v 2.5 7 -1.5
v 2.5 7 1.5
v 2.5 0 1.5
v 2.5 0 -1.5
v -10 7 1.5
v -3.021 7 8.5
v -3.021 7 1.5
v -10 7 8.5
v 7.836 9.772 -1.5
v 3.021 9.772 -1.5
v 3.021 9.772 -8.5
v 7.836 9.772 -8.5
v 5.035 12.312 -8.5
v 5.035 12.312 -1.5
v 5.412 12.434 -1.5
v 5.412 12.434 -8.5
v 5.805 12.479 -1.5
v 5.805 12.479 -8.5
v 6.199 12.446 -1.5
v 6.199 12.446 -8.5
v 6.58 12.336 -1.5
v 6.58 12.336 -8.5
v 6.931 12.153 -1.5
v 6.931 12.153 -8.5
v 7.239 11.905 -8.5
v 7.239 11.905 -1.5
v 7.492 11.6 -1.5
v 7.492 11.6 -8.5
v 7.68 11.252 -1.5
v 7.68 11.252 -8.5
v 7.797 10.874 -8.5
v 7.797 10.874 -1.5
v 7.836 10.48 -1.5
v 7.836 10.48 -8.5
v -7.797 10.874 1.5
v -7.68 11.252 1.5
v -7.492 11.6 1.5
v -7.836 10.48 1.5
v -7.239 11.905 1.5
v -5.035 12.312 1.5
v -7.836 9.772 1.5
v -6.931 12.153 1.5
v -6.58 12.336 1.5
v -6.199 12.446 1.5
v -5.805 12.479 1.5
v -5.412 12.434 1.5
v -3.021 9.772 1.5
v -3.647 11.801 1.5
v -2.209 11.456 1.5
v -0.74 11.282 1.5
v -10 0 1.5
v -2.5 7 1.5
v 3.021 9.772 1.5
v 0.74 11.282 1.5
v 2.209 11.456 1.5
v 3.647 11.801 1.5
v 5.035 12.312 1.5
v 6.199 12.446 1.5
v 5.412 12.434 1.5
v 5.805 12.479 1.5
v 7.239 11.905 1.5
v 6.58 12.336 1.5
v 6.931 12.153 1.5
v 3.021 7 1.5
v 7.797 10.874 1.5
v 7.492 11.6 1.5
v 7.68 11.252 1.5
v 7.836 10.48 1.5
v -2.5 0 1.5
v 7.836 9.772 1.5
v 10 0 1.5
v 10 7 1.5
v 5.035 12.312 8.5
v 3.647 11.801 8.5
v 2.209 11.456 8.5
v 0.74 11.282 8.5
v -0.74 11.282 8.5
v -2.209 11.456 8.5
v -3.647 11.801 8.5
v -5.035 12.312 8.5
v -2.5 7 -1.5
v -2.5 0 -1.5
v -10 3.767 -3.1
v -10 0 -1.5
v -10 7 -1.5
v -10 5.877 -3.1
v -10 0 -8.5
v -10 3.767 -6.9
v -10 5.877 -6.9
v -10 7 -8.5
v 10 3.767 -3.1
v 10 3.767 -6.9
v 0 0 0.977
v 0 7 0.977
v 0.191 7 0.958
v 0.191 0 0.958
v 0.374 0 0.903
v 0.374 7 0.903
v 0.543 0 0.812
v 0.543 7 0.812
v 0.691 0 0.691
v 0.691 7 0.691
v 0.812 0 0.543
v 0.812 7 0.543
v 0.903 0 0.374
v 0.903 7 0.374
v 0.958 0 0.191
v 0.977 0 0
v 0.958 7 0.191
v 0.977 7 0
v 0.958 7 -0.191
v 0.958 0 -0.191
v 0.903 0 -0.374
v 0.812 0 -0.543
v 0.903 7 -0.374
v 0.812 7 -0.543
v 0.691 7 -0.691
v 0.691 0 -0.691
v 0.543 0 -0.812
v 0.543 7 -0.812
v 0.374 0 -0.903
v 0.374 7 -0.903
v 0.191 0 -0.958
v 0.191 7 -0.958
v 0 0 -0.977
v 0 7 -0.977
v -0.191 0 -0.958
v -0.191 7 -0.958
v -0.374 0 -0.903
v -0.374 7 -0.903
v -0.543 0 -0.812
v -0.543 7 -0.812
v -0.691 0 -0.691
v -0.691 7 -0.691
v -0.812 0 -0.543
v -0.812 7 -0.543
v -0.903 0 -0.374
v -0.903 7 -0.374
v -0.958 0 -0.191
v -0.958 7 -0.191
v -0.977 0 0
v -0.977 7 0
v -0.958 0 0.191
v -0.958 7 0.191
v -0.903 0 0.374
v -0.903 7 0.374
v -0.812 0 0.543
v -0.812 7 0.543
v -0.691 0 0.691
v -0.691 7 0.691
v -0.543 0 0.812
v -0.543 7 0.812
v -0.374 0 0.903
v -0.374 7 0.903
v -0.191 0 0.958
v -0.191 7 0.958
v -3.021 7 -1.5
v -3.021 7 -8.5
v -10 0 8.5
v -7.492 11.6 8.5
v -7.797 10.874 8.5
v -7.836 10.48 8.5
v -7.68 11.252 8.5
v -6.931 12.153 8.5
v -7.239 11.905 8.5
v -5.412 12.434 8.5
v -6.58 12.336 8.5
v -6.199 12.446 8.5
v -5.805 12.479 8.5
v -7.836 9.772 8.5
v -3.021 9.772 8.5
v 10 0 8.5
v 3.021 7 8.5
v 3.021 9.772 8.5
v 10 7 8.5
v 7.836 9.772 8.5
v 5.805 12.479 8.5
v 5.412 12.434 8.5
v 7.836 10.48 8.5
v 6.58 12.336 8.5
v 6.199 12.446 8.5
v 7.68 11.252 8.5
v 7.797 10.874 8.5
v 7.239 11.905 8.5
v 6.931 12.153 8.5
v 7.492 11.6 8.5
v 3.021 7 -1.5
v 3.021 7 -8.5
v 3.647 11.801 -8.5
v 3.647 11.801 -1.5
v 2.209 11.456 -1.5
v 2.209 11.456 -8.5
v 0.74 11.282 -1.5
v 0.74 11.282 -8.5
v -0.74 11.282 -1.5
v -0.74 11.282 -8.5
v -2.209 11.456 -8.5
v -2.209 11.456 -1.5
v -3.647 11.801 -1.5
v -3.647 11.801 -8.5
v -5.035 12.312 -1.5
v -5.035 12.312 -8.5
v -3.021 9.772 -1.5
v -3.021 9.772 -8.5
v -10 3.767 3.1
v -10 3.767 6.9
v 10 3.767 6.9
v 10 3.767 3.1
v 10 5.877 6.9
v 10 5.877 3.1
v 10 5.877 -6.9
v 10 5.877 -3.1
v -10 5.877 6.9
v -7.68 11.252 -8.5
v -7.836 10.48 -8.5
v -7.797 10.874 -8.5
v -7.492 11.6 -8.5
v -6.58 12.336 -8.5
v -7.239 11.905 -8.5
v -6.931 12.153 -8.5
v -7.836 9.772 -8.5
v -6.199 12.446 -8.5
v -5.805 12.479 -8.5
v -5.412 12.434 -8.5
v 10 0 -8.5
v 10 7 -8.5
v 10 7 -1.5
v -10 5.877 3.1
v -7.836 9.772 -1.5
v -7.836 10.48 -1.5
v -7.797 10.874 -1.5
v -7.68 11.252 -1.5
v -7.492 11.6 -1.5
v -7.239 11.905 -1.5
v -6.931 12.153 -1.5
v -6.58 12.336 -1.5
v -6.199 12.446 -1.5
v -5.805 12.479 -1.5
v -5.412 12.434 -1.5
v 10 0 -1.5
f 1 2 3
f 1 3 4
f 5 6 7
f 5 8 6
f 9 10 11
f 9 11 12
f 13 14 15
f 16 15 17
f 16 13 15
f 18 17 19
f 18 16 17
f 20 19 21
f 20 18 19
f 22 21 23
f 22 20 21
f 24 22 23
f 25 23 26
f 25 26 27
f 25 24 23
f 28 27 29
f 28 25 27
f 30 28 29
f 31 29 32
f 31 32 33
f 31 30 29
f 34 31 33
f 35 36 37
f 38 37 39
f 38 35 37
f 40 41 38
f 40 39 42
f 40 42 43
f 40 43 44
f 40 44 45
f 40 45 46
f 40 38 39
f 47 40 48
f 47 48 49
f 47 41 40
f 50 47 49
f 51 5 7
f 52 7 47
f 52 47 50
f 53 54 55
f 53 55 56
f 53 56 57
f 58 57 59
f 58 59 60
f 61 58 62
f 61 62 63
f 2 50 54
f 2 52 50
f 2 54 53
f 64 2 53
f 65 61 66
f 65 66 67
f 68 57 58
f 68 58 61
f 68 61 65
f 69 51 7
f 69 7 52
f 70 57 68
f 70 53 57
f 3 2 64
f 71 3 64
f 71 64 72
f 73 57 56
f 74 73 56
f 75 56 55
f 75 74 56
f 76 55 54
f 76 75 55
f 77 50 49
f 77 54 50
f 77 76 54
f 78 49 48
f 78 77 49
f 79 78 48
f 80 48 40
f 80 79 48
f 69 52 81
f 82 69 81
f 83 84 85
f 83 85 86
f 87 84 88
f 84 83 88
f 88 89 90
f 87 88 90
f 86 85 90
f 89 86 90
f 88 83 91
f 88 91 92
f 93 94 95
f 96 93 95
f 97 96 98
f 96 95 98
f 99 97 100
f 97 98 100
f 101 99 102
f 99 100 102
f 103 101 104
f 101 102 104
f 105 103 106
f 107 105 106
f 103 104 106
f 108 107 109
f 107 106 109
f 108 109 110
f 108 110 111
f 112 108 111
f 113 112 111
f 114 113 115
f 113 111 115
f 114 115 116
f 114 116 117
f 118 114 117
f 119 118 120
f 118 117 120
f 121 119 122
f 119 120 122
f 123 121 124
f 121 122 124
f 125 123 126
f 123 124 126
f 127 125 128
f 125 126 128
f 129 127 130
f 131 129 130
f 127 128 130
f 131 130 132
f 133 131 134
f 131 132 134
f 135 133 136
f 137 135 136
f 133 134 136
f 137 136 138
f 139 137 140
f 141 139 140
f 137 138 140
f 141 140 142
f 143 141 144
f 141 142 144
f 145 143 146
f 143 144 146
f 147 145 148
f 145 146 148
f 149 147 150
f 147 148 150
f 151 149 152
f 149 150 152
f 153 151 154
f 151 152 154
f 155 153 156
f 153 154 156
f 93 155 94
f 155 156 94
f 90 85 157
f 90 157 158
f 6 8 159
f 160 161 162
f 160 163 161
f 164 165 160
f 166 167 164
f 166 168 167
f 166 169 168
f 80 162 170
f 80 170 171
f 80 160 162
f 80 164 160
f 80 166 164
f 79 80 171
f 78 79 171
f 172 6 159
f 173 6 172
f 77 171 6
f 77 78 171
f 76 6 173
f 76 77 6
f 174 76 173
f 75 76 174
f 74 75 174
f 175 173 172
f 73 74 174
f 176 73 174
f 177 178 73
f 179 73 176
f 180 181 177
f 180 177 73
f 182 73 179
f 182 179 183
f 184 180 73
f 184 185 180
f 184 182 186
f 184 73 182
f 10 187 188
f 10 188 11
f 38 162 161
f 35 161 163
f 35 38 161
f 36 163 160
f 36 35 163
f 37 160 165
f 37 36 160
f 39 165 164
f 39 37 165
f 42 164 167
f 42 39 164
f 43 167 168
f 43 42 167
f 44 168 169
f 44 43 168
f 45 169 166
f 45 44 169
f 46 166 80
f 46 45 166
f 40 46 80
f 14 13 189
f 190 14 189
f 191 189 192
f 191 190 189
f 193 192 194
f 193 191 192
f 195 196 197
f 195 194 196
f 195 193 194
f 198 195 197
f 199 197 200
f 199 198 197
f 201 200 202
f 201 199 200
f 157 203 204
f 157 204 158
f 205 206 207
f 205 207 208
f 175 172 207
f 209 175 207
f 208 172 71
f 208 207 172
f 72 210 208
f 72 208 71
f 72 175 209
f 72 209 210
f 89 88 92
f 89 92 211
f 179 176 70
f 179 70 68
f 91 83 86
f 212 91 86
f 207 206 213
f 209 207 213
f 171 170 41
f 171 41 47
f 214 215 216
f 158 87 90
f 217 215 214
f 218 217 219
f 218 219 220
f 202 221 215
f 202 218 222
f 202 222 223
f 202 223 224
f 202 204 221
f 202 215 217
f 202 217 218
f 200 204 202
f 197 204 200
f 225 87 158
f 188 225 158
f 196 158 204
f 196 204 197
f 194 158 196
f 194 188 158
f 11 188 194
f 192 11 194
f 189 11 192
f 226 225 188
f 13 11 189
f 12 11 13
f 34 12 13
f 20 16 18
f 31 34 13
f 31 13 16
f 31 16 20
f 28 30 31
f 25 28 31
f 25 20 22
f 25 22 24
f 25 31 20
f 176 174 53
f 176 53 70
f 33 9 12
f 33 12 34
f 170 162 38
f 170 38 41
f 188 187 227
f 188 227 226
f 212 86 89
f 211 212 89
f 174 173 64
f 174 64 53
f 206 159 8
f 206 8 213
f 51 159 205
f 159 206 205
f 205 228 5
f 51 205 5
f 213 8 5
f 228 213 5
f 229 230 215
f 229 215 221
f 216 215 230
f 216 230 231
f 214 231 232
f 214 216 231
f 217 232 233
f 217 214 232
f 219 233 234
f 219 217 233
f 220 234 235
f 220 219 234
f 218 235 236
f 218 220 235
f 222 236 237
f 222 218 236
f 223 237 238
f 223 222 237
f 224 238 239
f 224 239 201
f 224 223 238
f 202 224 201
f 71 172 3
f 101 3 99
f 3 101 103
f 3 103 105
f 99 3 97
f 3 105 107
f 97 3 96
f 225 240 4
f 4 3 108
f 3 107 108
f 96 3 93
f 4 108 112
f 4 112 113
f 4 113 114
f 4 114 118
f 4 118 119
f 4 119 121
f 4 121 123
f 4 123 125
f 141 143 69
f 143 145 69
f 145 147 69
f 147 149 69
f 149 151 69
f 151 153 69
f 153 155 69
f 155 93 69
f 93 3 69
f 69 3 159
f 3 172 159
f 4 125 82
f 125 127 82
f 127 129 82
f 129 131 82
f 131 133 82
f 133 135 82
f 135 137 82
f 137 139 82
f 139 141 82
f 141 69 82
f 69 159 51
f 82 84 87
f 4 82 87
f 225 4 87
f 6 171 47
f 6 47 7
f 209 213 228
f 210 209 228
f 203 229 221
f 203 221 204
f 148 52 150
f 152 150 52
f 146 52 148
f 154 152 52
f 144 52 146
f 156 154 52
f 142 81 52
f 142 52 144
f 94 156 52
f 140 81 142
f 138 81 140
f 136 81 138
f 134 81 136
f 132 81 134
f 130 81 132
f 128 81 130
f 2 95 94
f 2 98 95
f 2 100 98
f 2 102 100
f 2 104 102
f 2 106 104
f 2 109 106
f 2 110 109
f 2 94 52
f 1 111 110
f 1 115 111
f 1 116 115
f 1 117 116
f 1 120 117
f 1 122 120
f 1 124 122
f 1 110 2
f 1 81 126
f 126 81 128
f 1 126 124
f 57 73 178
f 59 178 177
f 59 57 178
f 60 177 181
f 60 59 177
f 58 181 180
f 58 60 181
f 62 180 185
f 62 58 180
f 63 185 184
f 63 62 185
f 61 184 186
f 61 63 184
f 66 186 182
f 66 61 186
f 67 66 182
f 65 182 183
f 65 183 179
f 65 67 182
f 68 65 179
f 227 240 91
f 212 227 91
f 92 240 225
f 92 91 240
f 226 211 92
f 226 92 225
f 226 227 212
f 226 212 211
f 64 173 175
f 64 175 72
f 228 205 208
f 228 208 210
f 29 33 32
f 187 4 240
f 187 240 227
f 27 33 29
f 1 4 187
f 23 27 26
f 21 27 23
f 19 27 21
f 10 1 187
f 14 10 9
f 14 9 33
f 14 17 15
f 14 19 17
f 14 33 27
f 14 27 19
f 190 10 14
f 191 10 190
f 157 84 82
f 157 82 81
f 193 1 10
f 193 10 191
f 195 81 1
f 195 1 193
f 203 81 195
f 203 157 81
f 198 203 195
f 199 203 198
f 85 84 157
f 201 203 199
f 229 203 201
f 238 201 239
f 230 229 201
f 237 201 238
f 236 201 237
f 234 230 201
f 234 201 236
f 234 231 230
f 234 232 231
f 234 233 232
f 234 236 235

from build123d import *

# Parameters (mm, degrees)
EXTRUDE_1_DEPTH        = 10
EXTRUDE_1_DEPTH_BACK   = 10
SKETCH_1_W             = 7
SKETCH_1_H             = 7
SKETCH_1_W_2           = 3.80020837
SKETCH_1_H_2           = 2.109580793
EXTRUDE_1_2_DEPTH      = 10
EXTRUDE_1_2_DEPTH_BACK = 10
SKETCH_2_W             = 5
SKETCH_2_H             = 3
SKETCH_2_R             = 0.977008115
EXTRUDE_2_DEPTH        = 7
EXTRUDE_3_REACH        = 22.928
FILLET_1_R             = 2
SKETCH_4_W             = 20
SKETCH_4_H             = 3
CUT_EXTRUDE_2_DEPTH    = 20


with BuildPart() as part:
    # 草图1 → 凸台-拉伸1 (new, two sides: drawn at the far end of the back side and taken through both)
    with BuildSketch(Plane(origin=(0, 0, 0), x_dir=(0, 0, -1), z_dir=(1, 0, 0)).offset(-EXTRUDE_1_DEPTH_BACK)):
        with Locations((-5, 3.5)):
            Rectangle(SKETCH_1_W, SKETCH_1_H)
        with Locations((-5, 4.821929683)):
            Rectangle(SKETCH_1_W_2, SKETCH_1_H_2, mode=Mode.SUBTRACT)
    extrude(amount=EXTRUDE_1_DEPTH + EXTRUDE_1_DEPTH_BACK)



with BuildPart() as body_2:
    # 草图1 → Extrude 1 2 (new, two sides: drawn at the far end of the back side and taken through both)
    with BuildSketch(Plane(origin=(0, 0, 0), x_dir=(0, 0, -1), z_dir=(1, 0, 0)).offset(-EXTRUDE_1_2_DEPTH_BACK)):
        with Locations((5, 3.5)):
            Rectangle(SKETCH_1_W, SKETCH_1_H)
        with Locations((5, 4.821929683)):
            Rectangle(SKETCH_1_W_2, SKETCH_1_H_2, mode=Mode.SUBTRACT)
    extrude(amount=EXTRUDE_1_2_DEPTH + EXTRUDE_1_2_DEPTH_BACK)


with BuildPart() as part_1:
    add(part.part)

    add(body_2.part)  # 凸台-拉伸2 merges body 2
    # 草图2 → 凸台-拉伸2 (add)
    with BuildSketch(Plane(origin=(0, 7, 0), x_dir=(1, 0, 0), z_dir=(0, 1, 0))):
        Rectangle(SKETCH_2_W, SKETCH_2_H)
        with Locations(Location((0, 0, 0), (0, 0, 270))):
            Circle(SKETCH_2_R, mode=Mode.SUBTRACT)
    extrude(amount=-EXTRUDE_2_DEPTH)

    # 凸台-拉伸3: up to this face of the body (flat: up to its plane)
    extrude_3_end = Plane(part_1.part.faces().sort_by_distance((0, 3.5, -8.5))[0])
    # 草图3 → 凸台-拉伸3 (add, up to the picked face)
    with BuildSketch(Plane.XY.offset(8.5), mode=Mode.PRIVATE) as extrude_3_sk1:
        with BuildLine():
            Line((-7.835690173, 14), (-7.835690173, 9.772160356))
            Line((-7.835690173, 9.772160356), (-3.020853064, 9.772160356))
            Line((-3.020853064, 9.772160356), (-3.020853064, 7))
            Line((-3.020853064, 7), (3.020853064, 7))
            Line((3.020853064, 7), (3.020853064, 9.772160356))
            Line((3.020853064, 9.772160356), (7.835690173, 9.772160356))
            Line((7.835690173, 9.772160356), (7.835690173, 14))
            ThreePointArc((7.835690173, 14), (0, 11.260367321), (-7.835690173, 14))
        make_face()
    extrude_3_tool1 = split(extrude(extrude_3_sk1.sketch, amount=-EXTRUDE_3_REACH, mode=Mode.PRIVATE), bisect_by=extrude_3_end, keep=Keep.BOTH, mode=Mode.PRIVATE)
    add(extrude_3_tool1.solids().sort_by(Axis((0, 10.244558, 8.5), (0, 0, -1)))[0])

    # 圆角1
    fillet_1_edges = [part_1.edges().sort_by_distance(p)[0] for p in [
        (7.835690173, 14, 0),
        (-7.835690173, 14, 0),
    ]]
    fillet(fillet_1_edges, radius=FILLET_1_R)

    # 草图4 → 切除-拉伸2 (cut)
    with BuildSketch(Plane(origin=(0, 7, 0), x_dir=(1, 0, 0), z_dir=(0, 1, 0))):
        Rectangle(SKETCH_4_W, SKETCH_4_H)
    extrude(amount=CUT_EXTRUDE_2_DEPTH, mode=Mode.SUBTRACT)


solid = part_1.part
